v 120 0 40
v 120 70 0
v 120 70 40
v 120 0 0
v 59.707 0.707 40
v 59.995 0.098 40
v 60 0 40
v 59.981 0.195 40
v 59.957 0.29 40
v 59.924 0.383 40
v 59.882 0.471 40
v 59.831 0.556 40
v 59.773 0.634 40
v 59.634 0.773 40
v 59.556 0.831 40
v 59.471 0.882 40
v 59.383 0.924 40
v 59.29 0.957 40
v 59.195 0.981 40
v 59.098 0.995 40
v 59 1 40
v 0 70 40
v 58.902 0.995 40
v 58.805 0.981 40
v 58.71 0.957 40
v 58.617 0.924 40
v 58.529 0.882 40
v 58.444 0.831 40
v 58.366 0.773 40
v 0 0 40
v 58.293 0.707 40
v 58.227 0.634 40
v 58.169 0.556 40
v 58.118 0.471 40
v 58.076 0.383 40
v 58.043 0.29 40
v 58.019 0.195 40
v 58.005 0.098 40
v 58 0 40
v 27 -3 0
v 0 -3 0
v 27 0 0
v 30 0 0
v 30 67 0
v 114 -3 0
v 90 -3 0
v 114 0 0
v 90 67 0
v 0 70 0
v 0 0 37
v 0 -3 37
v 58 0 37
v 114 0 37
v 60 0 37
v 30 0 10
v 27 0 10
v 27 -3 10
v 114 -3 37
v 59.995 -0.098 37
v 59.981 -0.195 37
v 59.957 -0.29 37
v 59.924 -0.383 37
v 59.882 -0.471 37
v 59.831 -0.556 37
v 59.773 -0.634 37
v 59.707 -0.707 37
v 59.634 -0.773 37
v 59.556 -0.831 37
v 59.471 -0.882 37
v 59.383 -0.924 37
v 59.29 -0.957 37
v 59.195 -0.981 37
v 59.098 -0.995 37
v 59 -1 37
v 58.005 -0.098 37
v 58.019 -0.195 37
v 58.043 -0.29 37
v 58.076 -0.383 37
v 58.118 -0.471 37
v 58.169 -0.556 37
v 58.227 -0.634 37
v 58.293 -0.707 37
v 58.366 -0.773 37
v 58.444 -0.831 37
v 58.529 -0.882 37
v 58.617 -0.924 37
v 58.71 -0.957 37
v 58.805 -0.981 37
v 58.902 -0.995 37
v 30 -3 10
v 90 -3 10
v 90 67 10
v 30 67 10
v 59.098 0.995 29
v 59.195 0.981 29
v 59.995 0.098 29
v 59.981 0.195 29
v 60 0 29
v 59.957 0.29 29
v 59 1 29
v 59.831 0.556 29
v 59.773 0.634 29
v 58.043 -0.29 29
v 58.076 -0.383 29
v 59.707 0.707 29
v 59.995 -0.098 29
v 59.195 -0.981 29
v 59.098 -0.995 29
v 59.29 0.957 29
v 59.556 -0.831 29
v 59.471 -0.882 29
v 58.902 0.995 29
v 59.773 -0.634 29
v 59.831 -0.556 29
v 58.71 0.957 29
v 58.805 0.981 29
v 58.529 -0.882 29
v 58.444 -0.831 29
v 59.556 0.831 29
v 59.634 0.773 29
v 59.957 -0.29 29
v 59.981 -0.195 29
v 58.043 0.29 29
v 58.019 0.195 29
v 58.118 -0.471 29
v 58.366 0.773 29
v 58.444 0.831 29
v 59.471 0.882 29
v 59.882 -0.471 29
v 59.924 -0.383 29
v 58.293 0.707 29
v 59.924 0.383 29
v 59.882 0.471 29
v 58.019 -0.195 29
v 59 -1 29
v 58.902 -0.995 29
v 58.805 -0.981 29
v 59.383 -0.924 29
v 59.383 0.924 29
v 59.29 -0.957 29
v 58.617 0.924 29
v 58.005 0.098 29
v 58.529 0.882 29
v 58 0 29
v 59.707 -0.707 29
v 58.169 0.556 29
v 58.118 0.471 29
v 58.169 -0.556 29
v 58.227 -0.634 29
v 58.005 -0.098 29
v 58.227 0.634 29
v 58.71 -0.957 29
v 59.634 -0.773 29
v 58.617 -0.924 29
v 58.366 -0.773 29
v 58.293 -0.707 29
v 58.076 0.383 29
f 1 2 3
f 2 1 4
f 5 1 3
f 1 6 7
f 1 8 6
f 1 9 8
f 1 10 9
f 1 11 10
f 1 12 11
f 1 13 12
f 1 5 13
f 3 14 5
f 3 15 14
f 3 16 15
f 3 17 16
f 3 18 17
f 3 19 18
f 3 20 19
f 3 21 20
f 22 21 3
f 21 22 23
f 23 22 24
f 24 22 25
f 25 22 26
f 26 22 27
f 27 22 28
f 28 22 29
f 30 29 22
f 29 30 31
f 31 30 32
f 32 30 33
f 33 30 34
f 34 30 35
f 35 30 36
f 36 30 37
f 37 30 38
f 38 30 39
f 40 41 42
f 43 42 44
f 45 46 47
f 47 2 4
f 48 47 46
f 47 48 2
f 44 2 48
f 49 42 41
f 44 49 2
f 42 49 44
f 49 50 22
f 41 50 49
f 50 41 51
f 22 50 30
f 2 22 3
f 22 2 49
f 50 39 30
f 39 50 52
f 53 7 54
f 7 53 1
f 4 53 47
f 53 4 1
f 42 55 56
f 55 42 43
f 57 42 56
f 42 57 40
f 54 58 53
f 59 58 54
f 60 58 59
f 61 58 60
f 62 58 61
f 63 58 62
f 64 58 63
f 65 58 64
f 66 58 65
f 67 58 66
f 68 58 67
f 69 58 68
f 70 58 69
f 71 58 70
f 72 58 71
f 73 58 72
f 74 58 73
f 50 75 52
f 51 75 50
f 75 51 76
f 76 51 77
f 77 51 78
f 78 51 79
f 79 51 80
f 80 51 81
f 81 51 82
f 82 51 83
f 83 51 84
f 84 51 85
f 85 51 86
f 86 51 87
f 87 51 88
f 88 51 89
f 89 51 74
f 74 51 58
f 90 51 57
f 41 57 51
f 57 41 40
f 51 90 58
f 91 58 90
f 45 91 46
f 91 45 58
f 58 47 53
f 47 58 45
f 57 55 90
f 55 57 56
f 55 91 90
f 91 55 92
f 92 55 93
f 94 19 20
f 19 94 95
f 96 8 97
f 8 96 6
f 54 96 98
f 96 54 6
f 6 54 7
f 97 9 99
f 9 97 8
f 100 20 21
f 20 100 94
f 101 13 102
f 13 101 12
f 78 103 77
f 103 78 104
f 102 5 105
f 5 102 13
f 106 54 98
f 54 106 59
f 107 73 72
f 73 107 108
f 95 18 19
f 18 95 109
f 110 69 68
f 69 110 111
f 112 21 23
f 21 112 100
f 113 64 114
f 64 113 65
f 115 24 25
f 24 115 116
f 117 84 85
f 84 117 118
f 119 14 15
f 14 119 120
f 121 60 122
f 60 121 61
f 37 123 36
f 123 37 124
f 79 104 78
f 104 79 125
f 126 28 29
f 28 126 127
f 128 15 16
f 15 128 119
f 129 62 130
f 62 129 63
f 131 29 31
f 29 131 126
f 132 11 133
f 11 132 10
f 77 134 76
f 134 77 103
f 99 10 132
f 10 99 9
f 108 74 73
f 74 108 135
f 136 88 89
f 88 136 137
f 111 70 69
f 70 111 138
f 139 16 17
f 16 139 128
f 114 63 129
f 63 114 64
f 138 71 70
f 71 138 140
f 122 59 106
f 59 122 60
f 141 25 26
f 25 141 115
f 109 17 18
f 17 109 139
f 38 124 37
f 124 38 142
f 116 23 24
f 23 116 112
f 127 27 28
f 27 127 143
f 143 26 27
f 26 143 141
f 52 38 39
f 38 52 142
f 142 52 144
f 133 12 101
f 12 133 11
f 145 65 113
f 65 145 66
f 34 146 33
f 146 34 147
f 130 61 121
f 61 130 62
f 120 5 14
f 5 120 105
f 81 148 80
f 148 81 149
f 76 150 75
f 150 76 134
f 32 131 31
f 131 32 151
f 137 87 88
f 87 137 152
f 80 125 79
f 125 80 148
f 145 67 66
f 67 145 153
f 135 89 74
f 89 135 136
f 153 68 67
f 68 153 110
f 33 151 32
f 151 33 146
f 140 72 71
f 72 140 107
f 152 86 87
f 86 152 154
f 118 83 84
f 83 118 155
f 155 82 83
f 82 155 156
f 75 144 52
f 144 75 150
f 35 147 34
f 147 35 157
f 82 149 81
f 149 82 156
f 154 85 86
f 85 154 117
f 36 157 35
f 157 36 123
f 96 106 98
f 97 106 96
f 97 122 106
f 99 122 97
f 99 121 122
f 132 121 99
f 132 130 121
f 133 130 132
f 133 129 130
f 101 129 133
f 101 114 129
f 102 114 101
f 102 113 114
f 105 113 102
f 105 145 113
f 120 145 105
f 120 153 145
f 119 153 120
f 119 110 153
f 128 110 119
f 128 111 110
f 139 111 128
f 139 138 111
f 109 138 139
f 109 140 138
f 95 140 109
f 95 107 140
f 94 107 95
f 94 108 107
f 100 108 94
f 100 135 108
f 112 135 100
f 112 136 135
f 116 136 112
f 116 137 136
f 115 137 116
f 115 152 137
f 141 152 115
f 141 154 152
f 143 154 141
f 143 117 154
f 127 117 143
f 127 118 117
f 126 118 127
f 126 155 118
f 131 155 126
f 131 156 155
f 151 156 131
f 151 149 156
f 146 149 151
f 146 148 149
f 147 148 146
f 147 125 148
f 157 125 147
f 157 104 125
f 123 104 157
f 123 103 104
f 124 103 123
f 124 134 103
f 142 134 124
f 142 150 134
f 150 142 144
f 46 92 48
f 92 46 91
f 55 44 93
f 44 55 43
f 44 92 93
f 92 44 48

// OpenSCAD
// Mini Horizontal Gel Electrophoresis Buffer Tank
// Outer dimensions: 120 x 70 x 40 mm
// Wall thickness: 3 mm
// Floor thickness: 3 mm
// Inner platform: 60 mm long, full width, 10 mm high from inner floor

$fn = 64;

// Outer dimensions
X_OUT = 120;
Y_OUT = 70;
Z_OUT = 40;

// Thicknesses
wall_t = 3;
floor_t = 3;

// Inner dimensions
X_IN  = X_OUT - 2 * wall_t;
Y_IN  = Y_OUT - 2 * wall_t;
Z_IN  = Z_OUT - floor_t;

// Platform dimensions
plat_len = 60;
plat_w   = Y_IN;
plat_h   = 10; // Height from inner floor

// Electrode hole
hole_d   = 2;
hole_y   = 0;
hole_z   = 30;

// Build the main tank body (hollow box)
// We construct the outer shell and subtract the inner void.
// The inner void is split by the platform.

difference() {
    // 1. Outer Shell
    // Create a solid block and subtract the inner cavity.
    // The inner cavity is defined by the union of the two buffer chambers and the space above the platform.
    
    union() {
        // Outer block
        translate([0, 0, 0]) cube([X_OUT, Y_OUT, Z_OUT]);
        
        // Inner void (to be subtracted)
        // The void consists of the two side chambers and the space above the platform.
        // Chamber 1 (Left): x from 0 to (X_IN - plat_len)/2
        // Chamber 2 (Right): x from (X_IN + plat_len)/2 to X_IN
        // Space Above: x from 0 to X_IN, z from plat_h to Z_IN
        
        void_h = X_IN - plat_len; // Total width of chambers
        half_void = void_h / 2;   // Width of one chamber
        
        // Chamber 1
        translate([0, -wall_t, 0]) 
            cube([half_void, Y_OUT, Z_IN]);
            
        // Chamber 2
        translate([X_IN - half_void, -wall_t, 0]) 
            cube([half_void, Y_OUT, Z_IN]);
            
        // Space above platform
        translate([0, -wall_t, plat_h]) 
            cube([X_IN, Y_OUT, Z_IN - plat_h]);
            
    }
    
    // 2. Platform (Solid block inside the void)
    // Positioned at the bottom of the void, centered in X.
    // Bottom of platform is at z = floor_t (outer bottom) + 0? 
    // Wait, the prompt says "top is 10 mm above the inner floor".
    // Inner floor is at z = floor_t = 3.
    // So platform top is at z = 3 + 10 = 13.
    // Platform height is 10, so bottom is at z = 3.
    // It spans full inner width Y_IN.
    // It is centered in X.
    
    translate([
        (X_OUT - plat_len) / 2, 
        -wall_t, 
        0 
    ]) 
        cube([plat_len, Y_OUT, plat_h]);
        
    // 3. Electrode Holes
    // Horizontal holes along X axis.
    // Centered at y = 0, z = 30.
    // Diameter = 2 mm.
    // Length = X_OUT (through the whole tank).
    
    for (side = [-1, 1]) {
        translate([
            side * (X_OUT / 2 - hole_d / 2), 
            side * hole_y, 
            hole_z - hole_d / 2
        ]) 
            cylinder(h = X_OUT, d = hole_d);
    }
}
